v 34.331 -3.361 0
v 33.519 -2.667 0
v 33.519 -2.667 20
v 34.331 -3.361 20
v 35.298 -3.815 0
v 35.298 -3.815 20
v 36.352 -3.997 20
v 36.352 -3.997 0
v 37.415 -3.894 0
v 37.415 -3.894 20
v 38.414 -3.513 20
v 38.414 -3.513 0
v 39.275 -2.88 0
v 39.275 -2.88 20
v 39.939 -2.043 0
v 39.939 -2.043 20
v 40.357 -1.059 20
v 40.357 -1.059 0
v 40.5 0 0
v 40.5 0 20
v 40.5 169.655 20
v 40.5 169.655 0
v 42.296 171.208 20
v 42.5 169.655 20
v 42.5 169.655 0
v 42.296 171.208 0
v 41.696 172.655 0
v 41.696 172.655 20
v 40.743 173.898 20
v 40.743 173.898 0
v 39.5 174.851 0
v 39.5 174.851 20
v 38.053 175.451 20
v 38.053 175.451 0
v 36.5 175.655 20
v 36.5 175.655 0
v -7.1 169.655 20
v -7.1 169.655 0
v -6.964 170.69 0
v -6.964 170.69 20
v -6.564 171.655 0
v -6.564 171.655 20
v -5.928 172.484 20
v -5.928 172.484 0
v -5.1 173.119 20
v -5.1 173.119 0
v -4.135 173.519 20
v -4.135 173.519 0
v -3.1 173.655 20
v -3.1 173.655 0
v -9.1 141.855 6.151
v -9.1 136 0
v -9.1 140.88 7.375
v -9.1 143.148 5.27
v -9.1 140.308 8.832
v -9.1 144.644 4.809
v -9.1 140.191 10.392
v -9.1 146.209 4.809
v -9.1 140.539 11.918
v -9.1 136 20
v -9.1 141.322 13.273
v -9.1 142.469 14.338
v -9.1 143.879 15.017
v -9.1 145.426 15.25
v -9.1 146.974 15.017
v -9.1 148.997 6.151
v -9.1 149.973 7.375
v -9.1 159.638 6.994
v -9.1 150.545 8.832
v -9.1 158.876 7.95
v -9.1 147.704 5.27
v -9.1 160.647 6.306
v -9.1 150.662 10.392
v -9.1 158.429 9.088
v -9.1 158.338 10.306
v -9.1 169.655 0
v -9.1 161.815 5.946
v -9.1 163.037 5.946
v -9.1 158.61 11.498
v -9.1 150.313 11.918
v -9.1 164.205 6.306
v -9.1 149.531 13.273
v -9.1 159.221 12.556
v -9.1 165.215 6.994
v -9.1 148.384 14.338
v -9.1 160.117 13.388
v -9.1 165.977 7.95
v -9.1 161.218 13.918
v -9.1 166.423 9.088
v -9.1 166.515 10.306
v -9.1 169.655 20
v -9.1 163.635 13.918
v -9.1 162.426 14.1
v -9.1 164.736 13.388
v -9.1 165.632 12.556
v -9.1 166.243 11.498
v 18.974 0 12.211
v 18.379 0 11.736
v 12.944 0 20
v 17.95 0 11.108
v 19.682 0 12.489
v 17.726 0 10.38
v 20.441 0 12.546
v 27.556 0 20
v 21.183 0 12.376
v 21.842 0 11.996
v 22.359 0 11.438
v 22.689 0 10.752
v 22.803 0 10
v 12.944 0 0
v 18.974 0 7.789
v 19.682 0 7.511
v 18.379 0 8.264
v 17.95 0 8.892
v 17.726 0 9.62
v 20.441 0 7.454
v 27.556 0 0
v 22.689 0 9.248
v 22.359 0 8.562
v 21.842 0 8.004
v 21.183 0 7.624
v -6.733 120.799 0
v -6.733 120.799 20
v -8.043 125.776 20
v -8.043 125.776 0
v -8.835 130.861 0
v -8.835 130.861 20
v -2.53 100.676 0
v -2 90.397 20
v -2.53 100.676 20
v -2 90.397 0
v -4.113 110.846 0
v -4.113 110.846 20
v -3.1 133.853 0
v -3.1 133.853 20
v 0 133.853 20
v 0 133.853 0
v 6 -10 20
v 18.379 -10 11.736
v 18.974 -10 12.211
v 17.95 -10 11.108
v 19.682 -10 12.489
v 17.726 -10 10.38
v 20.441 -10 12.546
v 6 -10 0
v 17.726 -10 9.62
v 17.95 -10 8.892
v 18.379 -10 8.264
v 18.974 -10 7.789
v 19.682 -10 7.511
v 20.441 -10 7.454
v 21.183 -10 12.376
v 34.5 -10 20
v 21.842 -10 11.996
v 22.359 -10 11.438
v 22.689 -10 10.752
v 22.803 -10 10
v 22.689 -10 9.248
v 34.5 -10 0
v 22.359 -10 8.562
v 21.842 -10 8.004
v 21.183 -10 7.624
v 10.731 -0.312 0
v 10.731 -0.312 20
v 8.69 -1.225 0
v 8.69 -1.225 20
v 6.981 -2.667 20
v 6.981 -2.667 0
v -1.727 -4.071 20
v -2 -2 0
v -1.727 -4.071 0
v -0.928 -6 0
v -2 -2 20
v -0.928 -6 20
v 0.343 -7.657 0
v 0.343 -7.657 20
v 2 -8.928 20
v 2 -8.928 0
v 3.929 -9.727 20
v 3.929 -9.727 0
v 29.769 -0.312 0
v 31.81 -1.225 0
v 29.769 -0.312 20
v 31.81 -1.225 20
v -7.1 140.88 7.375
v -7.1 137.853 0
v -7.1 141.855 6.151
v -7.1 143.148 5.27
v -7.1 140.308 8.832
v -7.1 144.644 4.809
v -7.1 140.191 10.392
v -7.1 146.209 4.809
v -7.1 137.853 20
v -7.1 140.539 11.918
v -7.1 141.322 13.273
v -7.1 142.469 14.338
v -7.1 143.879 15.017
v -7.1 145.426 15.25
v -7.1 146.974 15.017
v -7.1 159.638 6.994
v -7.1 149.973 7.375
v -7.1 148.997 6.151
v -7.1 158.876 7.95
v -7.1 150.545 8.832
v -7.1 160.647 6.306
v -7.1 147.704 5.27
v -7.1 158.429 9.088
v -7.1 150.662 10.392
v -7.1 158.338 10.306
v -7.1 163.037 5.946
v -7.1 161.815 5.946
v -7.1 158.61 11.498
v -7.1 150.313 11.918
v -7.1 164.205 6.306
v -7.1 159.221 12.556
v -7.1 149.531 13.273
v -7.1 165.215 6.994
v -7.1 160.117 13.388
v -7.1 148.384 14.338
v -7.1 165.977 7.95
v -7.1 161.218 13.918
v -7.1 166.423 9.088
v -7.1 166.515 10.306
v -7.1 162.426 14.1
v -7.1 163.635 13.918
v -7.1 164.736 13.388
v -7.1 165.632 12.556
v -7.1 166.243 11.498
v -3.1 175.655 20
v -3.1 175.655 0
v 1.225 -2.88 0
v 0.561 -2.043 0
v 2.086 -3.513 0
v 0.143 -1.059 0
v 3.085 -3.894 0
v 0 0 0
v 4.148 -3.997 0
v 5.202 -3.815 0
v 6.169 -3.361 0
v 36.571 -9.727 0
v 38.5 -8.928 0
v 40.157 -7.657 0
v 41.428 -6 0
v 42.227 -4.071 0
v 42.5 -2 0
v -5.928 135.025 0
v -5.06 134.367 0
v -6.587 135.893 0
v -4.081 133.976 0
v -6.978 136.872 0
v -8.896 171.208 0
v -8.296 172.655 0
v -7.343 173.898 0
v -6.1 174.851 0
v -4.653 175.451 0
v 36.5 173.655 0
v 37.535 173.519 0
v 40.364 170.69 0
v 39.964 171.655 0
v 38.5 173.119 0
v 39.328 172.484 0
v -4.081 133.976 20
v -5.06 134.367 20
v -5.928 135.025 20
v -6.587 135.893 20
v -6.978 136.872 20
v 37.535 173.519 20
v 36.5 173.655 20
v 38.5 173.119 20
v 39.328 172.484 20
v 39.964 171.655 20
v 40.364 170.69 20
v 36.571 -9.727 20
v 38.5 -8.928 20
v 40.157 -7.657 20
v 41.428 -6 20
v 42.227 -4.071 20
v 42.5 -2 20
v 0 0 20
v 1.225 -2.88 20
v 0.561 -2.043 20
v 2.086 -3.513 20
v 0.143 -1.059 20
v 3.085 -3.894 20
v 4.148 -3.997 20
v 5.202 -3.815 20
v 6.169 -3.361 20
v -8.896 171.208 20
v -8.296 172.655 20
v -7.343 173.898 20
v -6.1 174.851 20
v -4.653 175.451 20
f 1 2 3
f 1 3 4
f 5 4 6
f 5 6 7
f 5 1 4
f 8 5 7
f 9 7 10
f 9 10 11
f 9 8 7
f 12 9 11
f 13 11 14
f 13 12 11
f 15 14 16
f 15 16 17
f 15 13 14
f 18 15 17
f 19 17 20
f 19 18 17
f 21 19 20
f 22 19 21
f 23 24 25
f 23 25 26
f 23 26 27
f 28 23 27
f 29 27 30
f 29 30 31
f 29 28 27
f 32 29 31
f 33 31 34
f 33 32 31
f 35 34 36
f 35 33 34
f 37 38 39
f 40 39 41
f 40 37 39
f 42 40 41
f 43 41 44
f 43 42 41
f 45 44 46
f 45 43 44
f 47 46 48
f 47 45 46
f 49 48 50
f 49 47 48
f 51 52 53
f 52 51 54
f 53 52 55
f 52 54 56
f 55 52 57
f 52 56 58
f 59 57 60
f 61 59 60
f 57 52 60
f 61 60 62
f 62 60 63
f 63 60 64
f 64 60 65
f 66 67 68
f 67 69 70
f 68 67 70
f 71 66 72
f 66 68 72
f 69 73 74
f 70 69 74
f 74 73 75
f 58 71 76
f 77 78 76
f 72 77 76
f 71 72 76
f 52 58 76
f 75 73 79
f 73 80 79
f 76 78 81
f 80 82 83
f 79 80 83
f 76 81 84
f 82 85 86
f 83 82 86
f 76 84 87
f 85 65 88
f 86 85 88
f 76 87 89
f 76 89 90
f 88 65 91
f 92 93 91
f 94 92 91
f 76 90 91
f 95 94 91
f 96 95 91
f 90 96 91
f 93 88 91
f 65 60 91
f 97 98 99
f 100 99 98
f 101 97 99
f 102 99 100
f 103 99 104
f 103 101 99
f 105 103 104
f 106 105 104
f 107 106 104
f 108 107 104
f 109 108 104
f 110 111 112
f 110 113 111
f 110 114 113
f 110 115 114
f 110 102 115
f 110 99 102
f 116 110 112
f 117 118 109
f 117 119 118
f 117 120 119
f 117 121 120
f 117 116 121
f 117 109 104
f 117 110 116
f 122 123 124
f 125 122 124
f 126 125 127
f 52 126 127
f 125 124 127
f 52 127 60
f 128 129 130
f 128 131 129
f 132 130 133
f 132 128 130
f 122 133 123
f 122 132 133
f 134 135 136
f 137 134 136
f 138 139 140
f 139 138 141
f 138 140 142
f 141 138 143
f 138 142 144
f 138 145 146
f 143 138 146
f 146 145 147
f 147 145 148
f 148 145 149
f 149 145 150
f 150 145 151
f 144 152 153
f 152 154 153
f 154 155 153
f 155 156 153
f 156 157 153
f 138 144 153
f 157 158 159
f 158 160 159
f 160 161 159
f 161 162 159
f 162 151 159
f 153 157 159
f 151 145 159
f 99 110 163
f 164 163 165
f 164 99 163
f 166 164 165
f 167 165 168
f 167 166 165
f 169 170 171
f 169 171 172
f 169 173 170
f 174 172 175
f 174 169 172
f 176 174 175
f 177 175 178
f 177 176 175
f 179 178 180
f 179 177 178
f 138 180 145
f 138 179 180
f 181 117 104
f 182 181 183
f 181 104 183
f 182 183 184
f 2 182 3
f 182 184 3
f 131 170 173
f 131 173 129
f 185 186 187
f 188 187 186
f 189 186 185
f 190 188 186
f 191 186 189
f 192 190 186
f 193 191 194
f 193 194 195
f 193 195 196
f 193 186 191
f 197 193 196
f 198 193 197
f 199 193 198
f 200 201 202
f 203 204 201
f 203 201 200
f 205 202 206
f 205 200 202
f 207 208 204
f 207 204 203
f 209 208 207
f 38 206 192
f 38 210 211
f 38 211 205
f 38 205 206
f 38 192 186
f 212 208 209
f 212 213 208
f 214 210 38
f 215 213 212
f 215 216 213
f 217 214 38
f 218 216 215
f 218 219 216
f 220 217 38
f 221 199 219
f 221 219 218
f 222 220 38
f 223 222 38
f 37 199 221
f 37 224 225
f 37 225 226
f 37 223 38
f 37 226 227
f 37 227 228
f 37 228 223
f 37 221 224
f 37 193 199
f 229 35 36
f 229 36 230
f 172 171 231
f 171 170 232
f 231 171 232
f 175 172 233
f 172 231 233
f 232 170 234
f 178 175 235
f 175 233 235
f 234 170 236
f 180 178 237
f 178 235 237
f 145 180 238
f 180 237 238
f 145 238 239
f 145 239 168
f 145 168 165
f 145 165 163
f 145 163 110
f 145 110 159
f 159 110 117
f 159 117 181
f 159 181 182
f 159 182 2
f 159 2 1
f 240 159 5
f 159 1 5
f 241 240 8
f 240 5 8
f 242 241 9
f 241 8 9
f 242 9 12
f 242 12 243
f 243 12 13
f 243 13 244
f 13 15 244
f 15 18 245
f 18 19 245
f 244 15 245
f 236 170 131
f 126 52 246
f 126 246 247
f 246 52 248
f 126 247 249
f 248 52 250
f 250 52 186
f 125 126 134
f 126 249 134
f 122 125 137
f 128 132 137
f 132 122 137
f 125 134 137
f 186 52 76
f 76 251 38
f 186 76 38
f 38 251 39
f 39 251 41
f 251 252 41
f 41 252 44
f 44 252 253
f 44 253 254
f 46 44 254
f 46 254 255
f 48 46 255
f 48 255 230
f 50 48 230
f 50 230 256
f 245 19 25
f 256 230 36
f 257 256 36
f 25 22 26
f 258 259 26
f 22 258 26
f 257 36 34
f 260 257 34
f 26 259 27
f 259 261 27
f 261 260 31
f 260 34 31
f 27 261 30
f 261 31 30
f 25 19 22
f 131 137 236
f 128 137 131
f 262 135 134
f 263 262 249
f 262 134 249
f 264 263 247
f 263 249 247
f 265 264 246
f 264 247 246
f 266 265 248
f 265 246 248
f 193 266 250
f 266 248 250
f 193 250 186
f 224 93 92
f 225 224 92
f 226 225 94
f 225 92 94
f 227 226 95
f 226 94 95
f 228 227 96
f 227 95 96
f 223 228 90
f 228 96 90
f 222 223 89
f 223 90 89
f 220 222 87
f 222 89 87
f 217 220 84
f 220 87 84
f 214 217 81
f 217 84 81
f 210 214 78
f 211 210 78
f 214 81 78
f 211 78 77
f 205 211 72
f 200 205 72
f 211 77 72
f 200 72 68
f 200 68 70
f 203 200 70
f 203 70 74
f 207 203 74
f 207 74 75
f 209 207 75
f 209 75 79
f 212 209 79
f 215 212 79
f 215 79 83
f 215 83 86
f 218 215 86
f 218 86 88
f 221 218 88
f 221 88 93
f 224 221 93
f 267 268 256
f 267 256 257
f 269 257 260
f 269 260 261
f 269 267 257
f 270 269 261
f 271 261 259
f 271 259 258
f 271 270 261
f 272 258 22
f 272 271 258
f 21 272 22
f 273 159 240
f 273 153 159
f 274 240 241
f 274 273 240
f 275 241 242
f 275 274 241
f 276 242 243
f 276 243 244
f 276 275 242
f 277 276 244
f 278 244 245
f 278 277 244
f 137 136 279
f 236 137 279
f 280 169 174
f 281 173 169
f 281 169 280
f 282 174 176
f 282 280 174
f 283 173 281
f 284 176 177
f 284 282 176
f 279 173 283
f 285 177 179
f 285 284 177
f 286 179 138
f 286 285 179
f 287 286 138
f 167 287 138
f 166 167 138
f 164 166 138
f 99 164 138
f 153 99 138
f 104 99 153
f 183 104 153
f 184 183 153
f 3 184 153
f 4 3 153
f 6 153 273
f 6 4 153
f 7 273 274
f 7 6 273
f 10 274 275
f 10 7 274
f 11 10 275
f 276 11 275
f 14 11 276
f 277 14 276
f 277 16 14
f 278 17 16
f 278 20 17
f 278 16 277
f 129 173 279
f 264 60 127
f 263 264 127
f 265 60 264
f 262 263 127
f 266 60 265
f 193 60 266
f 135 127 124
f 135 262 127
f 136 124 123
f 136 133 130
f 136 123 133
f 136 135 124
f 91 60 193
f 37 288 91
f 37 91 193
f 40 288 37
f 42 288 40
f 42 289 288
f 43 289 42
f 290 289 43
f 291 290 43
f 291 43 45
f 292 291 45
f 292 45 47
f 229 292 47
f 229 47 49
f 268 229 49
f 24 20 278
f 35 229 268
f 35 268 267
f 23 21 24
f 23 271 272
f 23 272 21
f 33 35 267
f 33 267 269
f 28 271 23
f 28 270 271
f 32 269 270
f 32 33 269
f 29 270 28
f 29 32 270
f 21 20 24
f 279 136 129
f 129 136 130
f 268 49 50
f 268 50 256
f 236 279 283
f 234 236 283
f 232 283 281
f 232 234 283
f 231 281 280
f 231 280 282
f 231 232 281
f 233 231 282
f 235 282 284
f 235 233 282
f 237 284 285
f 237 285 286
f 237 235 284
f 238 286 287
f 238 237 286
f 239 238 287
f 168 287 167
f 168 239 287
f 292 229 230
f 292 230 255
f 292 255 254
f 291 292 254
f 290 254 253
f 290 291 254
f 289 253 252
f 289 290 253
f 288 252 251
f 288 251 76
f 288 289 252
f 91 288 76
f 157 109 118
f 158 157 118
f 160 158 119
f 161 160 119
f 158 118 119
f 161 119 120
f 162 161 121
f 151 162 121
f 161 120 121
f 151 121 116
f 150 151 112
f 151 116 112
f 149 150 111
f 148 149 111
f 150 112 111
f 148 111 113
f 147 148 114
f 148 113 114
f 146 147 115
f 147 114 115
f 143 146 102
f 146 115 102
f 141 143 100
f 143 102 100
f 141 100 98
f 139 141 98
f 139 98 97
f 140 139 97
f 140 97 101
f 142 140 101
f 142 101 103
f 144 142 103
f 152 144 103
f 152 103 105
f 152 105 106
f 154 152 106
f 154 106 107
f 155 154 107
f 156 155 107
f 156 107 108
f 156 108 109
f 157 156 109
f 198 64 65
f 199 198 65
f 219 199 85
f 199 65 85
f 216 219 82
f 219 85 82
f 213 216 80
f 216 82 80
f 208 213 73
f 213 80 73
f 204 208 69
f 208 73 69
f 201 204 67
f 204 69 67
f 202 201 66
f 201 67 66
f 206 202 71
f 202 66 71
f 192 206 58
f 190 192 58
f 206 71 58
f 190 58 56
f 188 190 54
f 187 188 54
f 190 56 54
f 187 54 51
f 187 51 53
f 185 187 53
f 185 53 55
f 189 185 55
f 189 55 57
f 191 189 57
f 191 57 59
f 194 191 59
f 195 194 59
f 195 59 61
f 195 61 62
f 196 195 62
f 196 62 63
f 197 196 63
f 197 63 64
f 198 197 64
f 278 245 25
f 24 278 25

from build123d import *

# Parameters (mm, degrees)
SKETCH_1_W                = 44.5
SKETCH_1_H                = 182
EXTRUDE_1_DEPTH           = 20
FILLET_1_R                = 8
HOLE_WIZARD_1_4_201_D     = 5.1054
HOLE_WIZARD_1_4_201_DEPTH = 10
EXTRUDE_2_DEPTH           = 20
FILLET_2_R                = 100
CUT_EXTRUDE_1_REACH       = 180.298
CUT_EXTRUDE_2_REACH       = 180.781
SKETCH_7_R                = 5.25
EXTRUDE_3_DEPTH           = 20
FILLET_7_R                = 4
SKETCH_10_W               = 2
SKETCH_10_H               = 17.136672327
EXTRUDE_4_DEPTH           = 20
CUT_EXTRUDE_3_REACH       = 182.814
SKETCH_11_R               = 4.1
CUT_EXTRUDE_START         = -20
SKETCH_12_W               = 51.6
SKETCH_12_H               = 2.481518881
CUT_EXTRUDE_4_DEPTH       = 20
EXTRUDE_5_DEPTH           = 20


with BuildPart() as part:
    # Эскиз1 → Бобышка-Вытянуть1 (new body)
    with BuildSketch(Plane.XY):
        with Locations((20.25, 81)):
            Rectangle(SKETCH_1_W, SKETCH_1_H)
        with BuildLine():
            Line((8, 0), (32.5, 0))
            ThreePointArc((32.5, 0), (36.5, -4), (40.5, 0))
            Line((40.5, 0), (40.5, 170))
            Line((40.5, 170), (0, 170))
            Line((0, 170), (0, 0))
            ThreePointArc((0, 0), (4, -4), (8, 0))
        make_face(mode=Mode.SUBTRACT)
    extrude(amount=EXTRUDE_1_DEPTH)

    # Скругление1
    fillet_1_edges = [part.edges().sort_by_distance(p)[0] for p in [
        (8, 0, 10),
        (32.5, 0, 10),
        (42.5, -10, 10),
        (-2, -10, 10),
    ]]
    fillet(fillet_1_edges, radius=FILLET_1_R)

    # Отверстие обработанное метчиком 1/4-201
    with Locations(Plane(origin=(0, -10, 0), x_dir=(-1, 0, 0), z_dir=(0, -1, 0))):
        with Locations((-20.25, -10)):
            Hole(HOLE_WIZARD_1_4_201_D / 2, depth=HOLE_WIZARD_1_4_201_DEPTH)

    # Эскиз5 → Бобышка-Вытянуть2 (add)
    with BuildSketch(Plane.XY.offset(20)):
        with BuildLine():
            Line((-7.1, 155), (-7.1, 136))
            ThreePointArc((-7.1, 136), (-5.807601094, 124.936546651), (-2, 114.468859761))
            Line((-2, 114.468859761), (-2, 110.317515696))
            ThreePointArc((-2, 110.317515696), (-7.29232304, 122.677087406), (-9.1, 136))
            Line((-9.1, 136), (-9.1, 155))
            Line((-9.1, 155), (-7.1, 155))
        make_face()
    extrude(amount=-EXTRUDE_2_DEPTH)

    # Скругление2
    fillet_2_edges = [part.edges().sort_by_distance(p)[0] for p in [
        (-2, 110.317515696, 10),
    ]]
    fillet(fillet_2_edges, radius=FILLET_2_R)

    # Эскиз6 → Вырез-Вытянуть1 (cut, up to next)
    with BuildSketch(Plane.XY.offset(20), mode=Mode.PRIVATE) as cut_extrude_1_sk1:
        Polygon((0, 170), (0, 114.468859761), (-2, 114.468859761), (-2, 170), (-2, 172), (42.5, 172), (42.5, 170), align=None)
    cut_extrude_1_tool1 = extrude(cut_extrude_1_sk1.sketch, amount=-CUT_EXTRUDE_1_REACH, mode=Mode.PRIVATE) & part.part
    add(cut_extrude_1_tool1.solids().sort_by_distance((-0.72733, 142.23443, 20))[0], mode=Mode.SUBTRACT)

    # Эскиз7 → Вырез-Вытянуть2 (cut, up to next)
    with BuildSketch(Plane.ZY.offset(9.1), mode=Mode.PRIVATE) as cut_extrude_2_sk1:
        with Locations((10, 145.426275666)):
            Circle(SKETCH_7_R)
    cut_extrude_2_tool1 = extrude(cut_extrude_2_sk1.sketch, amount=-CUT_EXTRUDE_2_REACH, mode=Mode.PRIVATE) & part.part
    add(cut_extrude_2_tool1.solids().sort_by_distance((-9.1, 145.426276, 10))[0], mode=Mode.SUBTRACT)

    # Эскиз9 → Бобышка-Вытянуть3 (add)
    with BuildSketch(Plane.XY.offset(20)):
        with BuildLine():
            Line((-7.051971502, 133.853274797), (0, 133.853274797))
            Line((0, 133.853274797), (0, 114.468859761))
            Line((0, 114.468859761), (-2, 114.468859761))
            ThreePointArc((-2, 114.468859761), (-5.548456035, 123.894590796), (-7.051971502, 133.853274797))
        make_face()
    extrude(amount=-EXTRUDE_3_DEPTH)

    # Скругление7
    fillet_7_edges = [part.edges().sort_by_distance(p)[0] for p in [
        (-7.051971502, 133.853274797, 10),
    ]]
    fillet(fillet_7_edges, radius=FILLET_7_R)

    # Эскиз10 → Бобышка-Вытянуть4 (add)
    with BuildSketch(Plane.XY.offset(20)):
        with Locations((-8.1, 163.568336164)):
            Rectangle(SKETCH_10_W, SKETCH_10_H)
    extrude(amount=-EXTRUDE_4_DEPTH)

    # Эскиз11 → Вырез-Вытянуть3 (cut, up to next)
    with BuildSketch(Plane.ZY.offset(9.1), mode=Mode.PRIVATE) as cut_extrude_3_sk1:
        with Locations((10, 162.426275666)):
            Circle(SKETCH_11_R)
    cut_extrude_3_tool1 = extrude(cut_extrude_3_sk1.sketch, amount=-CUT_EXTRUDE_3_REACH, mode=Mode.PRIVATE) & part.part
    add(cut_extrude_3_tool1.solids().sort_by_distance((-9.1, 162.426276, 10))[0], mode=Mode.SUBTRACT)

    # Эскиз12 → Вырез-Вытянуть4 (cut)
    with BuildSketch(Plane.XY.offset(20).offset(CUT_EXTRUDE_START)):
        with Locations((16.7, 170.895912887)):
            Rectangle(SKETCH_12_W, SKETCH_12_H)
    extrude(amount=CUT_EXTRUDE_4_DEPTH, mode=Mode.SUBTRACT)

    # Эскиз13 → Бобышка-Вытянуть5 (add)
    with BuildSketch(Plane.XY.offset(20)):
        with BuildLine():
            Line((36.5, 175.655153446), (-3.1, 175.655153446))
            ThreePointArc((-3.1, 175.655153446), (-7.342640687, 173.897794133), (-9.1, 169.655153446))
            Line((-9.1, 169.655153446), (-7.1, 169.655153446))
            ThreePointArc((-7.1, 169.655153446), (-5.928427125, 172.483580571), (-3.1, 173.655153446))
            Line((-3.1, 173.655153446), (36.5, 173.655153446))
            ThreePointArc((36.5, 173.655153446), (39.328427125, 172.483580571), (40.5, 169.655153446))
            Line((40.5, 169.655153446), (42.5, 169.655153446))
            ThreePointArc((42.5, 169.655153446), (40.742640687, 173.897794133), (36.5, 175.655153446))
        make_face()
    extrude(amount=-EXTRUDE_5_DEPTH)


solid = part.part
